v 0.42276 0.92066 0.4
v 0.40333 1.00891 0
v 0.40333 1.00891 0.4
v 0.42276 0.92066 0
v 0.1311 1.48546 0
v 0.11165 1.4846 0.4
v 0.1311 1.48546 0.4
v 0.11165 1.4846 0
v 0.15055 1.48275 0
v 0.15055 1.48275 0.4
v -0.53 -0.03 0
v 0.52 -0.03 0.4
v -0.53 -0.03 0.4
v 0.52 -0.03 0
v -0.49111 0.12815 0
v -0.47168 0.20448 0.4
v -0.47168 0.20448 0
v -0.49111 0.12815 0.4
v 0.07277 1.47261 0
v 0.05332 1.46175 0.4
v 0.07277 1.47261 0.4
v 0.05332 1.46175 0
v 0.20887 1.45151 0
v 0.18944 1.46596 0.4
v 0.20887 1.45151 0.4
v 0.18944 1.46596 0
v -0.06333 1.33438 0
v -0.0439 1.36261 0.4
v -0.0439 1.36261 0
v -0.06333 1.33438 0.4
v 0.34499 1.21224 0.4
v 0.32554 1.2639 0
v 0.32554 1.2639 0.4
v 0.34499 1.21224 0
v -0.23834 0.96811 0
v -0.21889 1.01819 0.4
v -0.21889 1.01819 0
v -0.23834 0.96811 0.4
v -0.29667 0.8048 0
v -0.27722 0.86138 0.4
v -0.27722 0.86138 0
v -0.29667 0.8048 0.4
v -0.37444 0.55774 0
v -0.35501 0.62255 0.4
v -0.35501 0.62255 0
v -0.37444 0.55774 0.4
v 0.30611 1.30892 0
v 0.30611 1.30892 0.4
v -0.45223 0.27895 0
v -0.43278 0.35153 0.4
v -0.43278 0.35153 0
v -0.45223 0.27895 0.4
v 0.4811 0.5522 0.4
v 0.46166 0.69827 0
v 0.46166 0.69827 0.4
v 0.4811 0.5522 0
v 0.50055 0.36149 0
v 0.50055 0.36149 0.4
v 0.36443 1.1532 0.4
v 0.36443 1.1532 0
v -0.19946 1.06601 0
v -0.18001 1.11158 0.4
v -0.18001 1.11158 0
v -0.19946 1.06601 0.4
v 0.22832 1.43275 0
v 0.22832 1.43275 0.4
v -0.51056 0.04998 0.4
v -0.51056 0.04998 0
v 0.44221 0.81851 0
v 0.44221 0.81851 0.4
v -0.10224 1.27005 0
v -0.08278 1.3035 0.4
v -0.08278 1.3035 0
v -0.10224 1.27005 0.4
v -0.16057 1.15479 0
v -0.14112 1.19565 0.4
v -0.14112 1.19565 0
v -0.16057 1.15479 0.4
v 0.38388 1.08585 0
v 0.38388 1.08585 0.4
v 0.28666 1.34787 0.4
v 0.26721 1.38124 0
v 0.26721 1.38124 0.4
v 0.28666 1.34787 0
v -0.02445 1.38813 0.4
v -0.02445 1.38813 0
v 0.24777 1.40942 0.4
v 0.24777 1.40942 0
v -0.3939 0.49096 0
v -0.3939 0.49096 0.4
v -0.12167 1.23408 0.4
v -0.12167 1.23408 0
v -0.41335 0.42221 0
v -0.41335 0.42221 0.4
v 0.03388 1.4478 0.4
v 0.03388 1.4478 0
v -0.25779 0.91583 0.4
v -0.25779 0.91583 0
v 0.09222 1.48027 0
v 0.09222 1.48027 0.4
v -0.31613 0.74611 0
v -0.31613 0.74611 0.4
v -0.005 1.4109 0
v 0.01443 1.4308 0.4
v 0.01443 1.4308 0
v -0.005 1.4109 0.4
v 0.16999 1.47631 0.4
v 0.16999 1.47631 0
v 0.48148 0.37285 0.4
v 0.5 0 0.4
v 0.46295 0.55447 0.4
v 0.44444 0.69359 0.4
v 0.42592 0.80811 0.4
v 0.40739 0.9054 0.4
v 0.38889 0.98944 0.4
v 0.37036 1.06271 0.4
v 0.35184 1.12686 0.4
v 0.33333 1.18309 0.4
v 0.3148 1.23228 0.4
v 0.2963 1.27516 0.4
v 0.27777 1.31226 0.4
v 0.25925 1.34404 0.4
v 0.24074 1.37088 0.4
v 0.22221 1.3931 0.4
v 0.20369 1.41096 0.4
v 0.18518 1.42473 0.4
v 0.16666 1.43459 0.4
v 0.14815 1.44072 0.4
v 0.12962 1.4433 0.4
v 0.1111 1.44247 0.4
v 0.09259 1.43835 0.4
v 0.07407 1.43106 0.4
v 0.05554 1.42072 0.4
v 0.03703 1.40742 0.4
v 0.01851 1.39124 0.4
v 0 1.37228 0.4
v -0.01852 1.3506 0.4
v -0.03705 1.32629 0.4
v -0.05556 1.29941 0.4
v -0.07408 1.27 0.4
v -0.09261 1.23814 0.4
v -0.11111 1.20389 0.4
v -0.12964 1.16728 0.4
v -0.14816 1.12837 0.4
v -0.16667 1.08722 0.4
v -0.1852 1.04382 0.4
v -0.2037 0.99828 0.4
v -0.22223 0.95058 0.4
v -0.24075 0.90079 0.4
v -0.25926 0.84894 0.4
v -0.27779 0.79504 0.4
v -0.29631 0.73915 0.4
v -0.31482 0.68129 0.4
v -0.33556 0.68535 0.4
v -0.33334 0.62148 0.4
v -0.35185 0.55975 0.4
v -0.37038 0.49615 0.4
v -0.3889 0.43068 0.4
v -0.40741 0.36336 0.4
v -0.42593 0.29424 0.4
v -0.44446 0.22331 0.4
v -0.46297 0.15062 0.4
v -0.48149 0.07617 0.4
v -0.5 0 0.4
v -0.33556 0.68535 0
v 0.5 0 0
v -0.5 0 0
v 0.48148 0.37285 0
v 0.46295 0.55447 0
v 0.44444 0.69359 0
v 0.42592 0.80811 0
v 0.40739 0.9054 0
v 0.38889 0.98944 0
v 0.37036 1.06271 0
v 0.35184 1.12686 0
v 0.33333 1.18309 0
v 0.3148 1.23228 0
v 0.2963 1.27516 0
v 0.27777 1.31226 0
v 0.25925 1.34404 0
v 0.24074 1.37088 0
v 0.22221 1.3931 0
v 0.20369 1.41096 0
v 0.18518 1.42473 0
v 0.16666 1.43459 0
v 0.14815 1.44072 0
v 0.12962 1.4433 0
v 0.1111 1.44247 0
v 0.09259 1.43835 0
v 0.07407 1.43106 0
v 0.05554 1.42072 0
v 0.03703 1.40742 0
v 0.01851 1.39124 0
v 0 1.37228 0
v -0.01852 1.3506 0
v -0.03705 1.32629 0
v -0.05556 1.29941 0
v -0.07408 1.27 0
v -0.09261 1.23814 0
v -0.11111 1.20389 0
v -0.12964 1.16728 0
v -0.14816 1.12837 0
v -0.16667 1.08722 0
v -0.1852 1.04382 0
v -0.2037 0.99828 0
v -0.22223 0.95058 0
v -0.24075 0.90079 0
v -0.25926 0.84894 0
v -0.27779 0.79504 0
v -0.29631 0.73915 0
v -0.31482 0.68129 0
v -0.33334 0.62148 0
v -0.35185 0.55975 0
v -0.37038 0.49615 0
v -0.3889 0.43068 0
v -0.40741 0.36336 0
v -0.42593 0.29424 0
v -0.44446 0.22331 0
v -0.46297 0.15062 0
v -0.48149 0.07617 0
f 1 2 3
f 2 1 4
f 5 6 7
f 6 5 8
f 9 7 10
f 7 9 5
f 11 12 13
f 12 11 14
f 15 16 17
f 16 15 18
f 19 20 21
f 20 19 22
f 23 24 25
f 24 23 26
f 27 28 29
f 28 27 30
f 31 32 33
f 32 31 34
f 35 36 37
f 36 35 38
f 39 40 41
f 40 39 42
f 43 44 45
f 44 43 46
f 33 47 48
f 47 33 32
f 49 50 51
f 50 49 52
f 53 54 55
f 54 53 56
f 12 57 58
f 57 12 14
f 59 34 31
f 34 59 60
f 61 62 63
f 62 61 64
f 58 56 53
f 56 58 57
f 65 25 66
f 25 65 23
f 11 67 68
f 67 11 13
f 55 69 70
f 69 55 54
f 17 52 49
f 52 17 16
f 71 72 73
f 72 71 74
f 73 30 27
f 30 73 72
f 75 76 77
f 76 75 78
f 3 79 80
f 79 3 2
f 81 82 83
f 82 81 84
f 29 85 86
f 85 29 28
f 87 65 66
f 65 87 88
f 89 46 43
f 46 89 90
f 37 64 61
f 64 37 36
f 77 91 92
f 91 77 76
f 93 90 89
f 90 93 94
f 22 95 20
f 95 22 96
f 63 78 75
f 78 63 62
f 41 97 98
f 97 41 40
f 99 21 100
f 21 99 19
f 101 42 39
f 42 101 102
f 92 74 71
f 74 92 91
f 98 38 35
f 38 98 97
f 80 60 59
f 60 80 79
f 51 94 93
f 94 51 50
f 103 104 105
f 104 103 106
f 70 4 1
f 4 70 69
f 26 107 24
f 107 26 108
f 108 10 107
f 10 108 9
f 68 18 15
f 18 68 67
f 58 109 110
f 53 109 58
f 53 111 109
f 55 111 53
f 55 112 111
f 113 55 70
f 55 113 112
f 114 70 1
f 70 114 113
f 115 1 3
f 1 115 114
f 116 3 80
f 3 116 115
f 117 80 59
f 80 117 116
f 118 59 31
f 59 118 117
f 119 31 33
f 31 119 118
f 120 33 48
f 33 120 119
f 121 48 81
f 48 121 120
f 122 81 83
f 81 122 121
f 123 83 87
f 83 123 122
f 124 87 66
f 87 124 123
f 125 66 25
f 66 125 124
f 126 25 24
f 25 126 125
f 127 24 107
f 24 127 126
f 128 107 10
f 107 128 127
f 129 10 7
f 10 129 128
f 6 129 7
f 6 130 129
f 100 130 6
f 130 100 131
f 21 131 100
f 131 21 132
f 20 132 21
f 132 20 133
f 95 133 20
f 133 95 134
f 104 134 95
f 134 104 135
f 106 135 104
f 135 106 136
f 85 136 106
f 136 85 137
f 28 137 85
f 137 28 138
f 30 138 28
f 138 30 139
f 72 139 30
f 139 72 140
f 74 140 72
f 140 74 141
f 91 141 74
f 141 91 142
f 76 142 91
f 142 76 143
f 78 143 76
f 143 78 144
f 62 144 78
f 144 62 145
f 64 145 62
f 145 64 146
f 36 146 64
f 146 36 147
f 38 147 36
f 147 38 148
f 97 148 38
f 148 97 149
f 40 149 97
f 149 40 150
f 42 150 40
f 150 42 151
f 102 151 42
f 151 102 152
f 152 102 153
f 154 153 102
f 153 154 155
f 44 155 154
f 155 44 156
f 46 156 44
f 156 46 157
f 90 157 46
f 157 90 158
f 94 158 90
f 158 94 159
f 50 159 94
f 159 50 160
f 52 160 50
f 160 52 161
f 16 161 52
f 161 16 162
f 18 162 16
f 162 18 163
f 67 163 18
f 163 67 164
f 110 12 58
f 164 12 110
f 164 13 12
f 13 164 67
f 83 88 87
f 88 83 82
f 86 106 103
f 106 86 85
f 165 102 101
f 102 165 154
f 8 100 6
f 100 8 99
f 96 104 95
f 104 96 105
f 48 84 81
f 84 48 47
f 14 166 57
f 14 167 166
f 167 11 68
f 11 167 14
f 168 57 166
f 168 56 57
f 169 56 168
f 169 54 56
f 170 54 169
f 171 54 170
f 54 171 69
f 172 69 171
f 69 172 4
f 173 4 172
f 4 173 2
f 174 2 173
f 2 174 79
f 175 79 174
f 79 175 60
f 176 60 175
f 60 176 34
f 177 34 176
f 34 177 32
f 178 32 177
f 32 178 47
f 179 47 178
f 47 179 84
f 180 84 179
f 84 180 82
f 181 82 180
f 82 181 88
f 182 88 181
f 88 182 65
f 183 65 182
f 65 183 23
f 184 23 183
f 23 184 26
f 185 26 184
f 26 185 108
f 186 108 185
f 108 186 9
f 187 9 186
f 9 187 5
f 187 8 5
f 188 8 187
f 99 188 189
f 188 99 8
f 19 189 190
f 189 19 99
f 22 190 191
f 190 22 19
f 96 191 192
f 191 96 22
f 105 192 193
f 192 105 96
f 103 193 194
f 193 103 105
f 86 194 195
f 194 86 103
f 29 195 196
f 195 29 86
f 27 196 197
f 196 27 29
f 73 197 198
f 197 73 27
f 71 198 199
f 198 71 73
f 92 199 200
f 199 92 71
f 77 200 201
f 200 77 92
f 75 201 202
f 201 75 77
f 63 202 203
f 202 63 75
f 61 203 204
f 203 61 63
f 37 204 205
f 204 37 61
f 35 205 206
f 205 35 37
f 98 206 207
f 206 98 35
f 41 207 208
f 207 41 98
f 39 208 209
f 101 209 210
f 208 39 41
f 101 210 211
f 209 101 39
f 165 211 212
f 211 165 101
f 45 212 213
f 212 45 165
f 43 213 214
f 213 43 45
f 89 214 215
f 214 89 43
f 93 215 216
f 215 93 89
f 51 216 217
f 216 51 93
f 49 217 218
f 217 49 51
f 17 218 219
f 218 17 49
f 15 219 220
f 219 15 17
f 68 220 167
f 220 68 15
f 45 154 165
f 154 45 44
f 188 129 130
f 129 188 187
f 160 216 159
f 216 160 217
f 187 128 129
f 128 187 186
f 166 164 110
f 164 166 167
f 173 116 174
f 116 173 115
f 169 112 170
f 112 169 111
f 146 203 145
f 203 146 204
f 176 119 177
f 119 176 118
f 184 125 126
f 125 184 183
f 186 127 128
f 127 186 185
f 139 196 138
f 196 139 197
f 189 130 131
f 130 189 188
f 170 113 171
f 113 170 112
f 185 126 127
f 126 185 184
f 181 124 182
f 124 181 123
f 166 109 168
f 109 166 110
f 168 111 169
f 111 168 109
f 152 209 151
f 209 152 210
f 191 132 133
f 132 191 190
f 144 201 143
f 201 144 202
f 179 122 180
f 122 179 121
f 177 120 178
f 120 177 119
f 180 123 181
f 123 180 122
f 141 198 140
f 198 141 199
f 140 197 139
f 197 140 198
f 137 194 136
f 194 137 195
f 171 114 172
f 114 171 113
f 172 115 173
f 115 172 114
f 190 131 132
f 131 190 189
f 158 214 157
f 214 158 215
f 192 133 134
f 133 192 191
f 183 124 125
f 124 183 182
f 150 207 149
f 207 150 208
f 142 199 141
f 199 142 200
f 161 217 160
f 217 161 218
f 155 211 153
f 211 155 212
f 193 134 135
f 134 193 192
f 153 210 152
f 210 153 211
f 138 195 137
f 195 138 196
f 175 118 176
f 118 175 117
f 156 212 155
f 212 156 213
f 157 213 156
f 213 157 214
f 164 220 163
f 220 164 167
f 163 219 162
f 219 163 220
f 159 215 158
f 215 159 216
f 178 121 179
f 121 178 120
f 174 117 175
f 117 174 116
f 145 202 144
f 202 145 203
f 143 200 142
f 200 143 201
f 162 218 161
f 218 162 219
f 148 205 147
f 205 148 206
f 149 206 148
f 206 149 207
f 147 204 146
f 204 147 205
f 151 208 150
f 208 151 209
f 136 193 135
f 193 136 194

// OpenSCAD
points = [
	[0.0, 0.0],
	[0.018518518518518517, 0.0761778720049017],
	[0.037037037037037035, 0.15062439542505138],
	[0.05555555555555555, 0.223319514639746],
	[0.07407407407407407, 0.2942424369861692],
	[0.09259259259259259, 0.3633715883513339],
	[0.1111111111111111, 0.43068456505033625],
	[0.12962962962962962, 0.496158081591979],
	[0.14814814814814814, 0.5597679138801976],
	[0.16666666666666666, 0.6214888373388183],
	[0.18518518518518517, 0.6812945593764745],
	[0.2037037037037037, 0.7391576455261748],
	[0.2222222222222222, 0.7950494384977935],
	[0.24074074074074073, 0.8489399692689458],
	[0.25925925925925924, 0.9007978592069024],
	[0.2777777777777778, 0.950590212057334],
	[0.2962962962962963, 0.9982824944495623],
	[0.31481481481481477, 1.0438384033462986],
	[0.3333333333333333, 1.087219718600587],
	[0.35185185185185186, 1.1283861384637752],
	[0.37037037037037035, 1.1672950955030978],
	[0.38888888888888884, 1.203901549919676],
	[0.4074074074074074, 1.2381577566865556],
	[0.42592592592592593, 1.270013002225047],
	[0.4444444444444444, 1.2994133054709924],
	[0.4629629629629629, 1.3263010771049115],
	[0.48148148148148145, 1.3506147293705093],
	[0.5, 1.37228822720381],
	[0.5185185185185185, 1.3912505692311787],
	[0.537037037037037, 1.407425184420251],
	[0.5555555555555556, 1.4207292265792546],
	[0.5740740740740741, 1.4310727442134117],
	[0.5925925925925926, 1.4383576970620666],
	[0.611111111111111, 1.4424767823859064],
	[0.6296296296296295, 1.4433120229231085],
	[0.6481481481481481, 1.4407330531696978],
	[0.6666666666666666, 1.4345950194417547],
	[0.6851851851851851, 1.4247359792685335],
	[0.7037037037037037, 1.4109736427237216],
	[0.7222222222222222, 1.3931012354451804],
	[0.7407407407407407, 1.3708821690852144],
	[0.7592592592592592, 1.3440430609050202],
	[0.7777777777777777, 1.3122644174763076],
	[0.7962962962962963, 1.2751679292369156],
	[0.8148148148148148, 1.2322987030333752],
	[0.8333333333333333, 1.1830996730679935],
	[0.8518518518518519, 1.126873429466262],
	[0.8703703703703703, 1.0627227967716988],
	[0.8888888888888888, 0.9894533027918694],
	[0.9074074074074073, 0.9054018916738423],
	[0.9259259259259258, 0.8081078285981059],
	[0.9444444444444444, 0.6935954633238149],
	[0.9629629629629629, 0.5544784297482075],
	[0.9814814814814814, 0.37285432445674765],
	[1.0, 0.0],
];


difference(){
    
    //outer ring
    linear_extrude(0.4)
        translate([-0.53, -0.03, -0.1])
            scale(1.05, 1.05, 1.05)
                polygon(points);        
    
    //inner distribution to be subtracted
    linear_extrude(0.5)
        translate([-0.5, 0, 0])
            polygon(points);
}
